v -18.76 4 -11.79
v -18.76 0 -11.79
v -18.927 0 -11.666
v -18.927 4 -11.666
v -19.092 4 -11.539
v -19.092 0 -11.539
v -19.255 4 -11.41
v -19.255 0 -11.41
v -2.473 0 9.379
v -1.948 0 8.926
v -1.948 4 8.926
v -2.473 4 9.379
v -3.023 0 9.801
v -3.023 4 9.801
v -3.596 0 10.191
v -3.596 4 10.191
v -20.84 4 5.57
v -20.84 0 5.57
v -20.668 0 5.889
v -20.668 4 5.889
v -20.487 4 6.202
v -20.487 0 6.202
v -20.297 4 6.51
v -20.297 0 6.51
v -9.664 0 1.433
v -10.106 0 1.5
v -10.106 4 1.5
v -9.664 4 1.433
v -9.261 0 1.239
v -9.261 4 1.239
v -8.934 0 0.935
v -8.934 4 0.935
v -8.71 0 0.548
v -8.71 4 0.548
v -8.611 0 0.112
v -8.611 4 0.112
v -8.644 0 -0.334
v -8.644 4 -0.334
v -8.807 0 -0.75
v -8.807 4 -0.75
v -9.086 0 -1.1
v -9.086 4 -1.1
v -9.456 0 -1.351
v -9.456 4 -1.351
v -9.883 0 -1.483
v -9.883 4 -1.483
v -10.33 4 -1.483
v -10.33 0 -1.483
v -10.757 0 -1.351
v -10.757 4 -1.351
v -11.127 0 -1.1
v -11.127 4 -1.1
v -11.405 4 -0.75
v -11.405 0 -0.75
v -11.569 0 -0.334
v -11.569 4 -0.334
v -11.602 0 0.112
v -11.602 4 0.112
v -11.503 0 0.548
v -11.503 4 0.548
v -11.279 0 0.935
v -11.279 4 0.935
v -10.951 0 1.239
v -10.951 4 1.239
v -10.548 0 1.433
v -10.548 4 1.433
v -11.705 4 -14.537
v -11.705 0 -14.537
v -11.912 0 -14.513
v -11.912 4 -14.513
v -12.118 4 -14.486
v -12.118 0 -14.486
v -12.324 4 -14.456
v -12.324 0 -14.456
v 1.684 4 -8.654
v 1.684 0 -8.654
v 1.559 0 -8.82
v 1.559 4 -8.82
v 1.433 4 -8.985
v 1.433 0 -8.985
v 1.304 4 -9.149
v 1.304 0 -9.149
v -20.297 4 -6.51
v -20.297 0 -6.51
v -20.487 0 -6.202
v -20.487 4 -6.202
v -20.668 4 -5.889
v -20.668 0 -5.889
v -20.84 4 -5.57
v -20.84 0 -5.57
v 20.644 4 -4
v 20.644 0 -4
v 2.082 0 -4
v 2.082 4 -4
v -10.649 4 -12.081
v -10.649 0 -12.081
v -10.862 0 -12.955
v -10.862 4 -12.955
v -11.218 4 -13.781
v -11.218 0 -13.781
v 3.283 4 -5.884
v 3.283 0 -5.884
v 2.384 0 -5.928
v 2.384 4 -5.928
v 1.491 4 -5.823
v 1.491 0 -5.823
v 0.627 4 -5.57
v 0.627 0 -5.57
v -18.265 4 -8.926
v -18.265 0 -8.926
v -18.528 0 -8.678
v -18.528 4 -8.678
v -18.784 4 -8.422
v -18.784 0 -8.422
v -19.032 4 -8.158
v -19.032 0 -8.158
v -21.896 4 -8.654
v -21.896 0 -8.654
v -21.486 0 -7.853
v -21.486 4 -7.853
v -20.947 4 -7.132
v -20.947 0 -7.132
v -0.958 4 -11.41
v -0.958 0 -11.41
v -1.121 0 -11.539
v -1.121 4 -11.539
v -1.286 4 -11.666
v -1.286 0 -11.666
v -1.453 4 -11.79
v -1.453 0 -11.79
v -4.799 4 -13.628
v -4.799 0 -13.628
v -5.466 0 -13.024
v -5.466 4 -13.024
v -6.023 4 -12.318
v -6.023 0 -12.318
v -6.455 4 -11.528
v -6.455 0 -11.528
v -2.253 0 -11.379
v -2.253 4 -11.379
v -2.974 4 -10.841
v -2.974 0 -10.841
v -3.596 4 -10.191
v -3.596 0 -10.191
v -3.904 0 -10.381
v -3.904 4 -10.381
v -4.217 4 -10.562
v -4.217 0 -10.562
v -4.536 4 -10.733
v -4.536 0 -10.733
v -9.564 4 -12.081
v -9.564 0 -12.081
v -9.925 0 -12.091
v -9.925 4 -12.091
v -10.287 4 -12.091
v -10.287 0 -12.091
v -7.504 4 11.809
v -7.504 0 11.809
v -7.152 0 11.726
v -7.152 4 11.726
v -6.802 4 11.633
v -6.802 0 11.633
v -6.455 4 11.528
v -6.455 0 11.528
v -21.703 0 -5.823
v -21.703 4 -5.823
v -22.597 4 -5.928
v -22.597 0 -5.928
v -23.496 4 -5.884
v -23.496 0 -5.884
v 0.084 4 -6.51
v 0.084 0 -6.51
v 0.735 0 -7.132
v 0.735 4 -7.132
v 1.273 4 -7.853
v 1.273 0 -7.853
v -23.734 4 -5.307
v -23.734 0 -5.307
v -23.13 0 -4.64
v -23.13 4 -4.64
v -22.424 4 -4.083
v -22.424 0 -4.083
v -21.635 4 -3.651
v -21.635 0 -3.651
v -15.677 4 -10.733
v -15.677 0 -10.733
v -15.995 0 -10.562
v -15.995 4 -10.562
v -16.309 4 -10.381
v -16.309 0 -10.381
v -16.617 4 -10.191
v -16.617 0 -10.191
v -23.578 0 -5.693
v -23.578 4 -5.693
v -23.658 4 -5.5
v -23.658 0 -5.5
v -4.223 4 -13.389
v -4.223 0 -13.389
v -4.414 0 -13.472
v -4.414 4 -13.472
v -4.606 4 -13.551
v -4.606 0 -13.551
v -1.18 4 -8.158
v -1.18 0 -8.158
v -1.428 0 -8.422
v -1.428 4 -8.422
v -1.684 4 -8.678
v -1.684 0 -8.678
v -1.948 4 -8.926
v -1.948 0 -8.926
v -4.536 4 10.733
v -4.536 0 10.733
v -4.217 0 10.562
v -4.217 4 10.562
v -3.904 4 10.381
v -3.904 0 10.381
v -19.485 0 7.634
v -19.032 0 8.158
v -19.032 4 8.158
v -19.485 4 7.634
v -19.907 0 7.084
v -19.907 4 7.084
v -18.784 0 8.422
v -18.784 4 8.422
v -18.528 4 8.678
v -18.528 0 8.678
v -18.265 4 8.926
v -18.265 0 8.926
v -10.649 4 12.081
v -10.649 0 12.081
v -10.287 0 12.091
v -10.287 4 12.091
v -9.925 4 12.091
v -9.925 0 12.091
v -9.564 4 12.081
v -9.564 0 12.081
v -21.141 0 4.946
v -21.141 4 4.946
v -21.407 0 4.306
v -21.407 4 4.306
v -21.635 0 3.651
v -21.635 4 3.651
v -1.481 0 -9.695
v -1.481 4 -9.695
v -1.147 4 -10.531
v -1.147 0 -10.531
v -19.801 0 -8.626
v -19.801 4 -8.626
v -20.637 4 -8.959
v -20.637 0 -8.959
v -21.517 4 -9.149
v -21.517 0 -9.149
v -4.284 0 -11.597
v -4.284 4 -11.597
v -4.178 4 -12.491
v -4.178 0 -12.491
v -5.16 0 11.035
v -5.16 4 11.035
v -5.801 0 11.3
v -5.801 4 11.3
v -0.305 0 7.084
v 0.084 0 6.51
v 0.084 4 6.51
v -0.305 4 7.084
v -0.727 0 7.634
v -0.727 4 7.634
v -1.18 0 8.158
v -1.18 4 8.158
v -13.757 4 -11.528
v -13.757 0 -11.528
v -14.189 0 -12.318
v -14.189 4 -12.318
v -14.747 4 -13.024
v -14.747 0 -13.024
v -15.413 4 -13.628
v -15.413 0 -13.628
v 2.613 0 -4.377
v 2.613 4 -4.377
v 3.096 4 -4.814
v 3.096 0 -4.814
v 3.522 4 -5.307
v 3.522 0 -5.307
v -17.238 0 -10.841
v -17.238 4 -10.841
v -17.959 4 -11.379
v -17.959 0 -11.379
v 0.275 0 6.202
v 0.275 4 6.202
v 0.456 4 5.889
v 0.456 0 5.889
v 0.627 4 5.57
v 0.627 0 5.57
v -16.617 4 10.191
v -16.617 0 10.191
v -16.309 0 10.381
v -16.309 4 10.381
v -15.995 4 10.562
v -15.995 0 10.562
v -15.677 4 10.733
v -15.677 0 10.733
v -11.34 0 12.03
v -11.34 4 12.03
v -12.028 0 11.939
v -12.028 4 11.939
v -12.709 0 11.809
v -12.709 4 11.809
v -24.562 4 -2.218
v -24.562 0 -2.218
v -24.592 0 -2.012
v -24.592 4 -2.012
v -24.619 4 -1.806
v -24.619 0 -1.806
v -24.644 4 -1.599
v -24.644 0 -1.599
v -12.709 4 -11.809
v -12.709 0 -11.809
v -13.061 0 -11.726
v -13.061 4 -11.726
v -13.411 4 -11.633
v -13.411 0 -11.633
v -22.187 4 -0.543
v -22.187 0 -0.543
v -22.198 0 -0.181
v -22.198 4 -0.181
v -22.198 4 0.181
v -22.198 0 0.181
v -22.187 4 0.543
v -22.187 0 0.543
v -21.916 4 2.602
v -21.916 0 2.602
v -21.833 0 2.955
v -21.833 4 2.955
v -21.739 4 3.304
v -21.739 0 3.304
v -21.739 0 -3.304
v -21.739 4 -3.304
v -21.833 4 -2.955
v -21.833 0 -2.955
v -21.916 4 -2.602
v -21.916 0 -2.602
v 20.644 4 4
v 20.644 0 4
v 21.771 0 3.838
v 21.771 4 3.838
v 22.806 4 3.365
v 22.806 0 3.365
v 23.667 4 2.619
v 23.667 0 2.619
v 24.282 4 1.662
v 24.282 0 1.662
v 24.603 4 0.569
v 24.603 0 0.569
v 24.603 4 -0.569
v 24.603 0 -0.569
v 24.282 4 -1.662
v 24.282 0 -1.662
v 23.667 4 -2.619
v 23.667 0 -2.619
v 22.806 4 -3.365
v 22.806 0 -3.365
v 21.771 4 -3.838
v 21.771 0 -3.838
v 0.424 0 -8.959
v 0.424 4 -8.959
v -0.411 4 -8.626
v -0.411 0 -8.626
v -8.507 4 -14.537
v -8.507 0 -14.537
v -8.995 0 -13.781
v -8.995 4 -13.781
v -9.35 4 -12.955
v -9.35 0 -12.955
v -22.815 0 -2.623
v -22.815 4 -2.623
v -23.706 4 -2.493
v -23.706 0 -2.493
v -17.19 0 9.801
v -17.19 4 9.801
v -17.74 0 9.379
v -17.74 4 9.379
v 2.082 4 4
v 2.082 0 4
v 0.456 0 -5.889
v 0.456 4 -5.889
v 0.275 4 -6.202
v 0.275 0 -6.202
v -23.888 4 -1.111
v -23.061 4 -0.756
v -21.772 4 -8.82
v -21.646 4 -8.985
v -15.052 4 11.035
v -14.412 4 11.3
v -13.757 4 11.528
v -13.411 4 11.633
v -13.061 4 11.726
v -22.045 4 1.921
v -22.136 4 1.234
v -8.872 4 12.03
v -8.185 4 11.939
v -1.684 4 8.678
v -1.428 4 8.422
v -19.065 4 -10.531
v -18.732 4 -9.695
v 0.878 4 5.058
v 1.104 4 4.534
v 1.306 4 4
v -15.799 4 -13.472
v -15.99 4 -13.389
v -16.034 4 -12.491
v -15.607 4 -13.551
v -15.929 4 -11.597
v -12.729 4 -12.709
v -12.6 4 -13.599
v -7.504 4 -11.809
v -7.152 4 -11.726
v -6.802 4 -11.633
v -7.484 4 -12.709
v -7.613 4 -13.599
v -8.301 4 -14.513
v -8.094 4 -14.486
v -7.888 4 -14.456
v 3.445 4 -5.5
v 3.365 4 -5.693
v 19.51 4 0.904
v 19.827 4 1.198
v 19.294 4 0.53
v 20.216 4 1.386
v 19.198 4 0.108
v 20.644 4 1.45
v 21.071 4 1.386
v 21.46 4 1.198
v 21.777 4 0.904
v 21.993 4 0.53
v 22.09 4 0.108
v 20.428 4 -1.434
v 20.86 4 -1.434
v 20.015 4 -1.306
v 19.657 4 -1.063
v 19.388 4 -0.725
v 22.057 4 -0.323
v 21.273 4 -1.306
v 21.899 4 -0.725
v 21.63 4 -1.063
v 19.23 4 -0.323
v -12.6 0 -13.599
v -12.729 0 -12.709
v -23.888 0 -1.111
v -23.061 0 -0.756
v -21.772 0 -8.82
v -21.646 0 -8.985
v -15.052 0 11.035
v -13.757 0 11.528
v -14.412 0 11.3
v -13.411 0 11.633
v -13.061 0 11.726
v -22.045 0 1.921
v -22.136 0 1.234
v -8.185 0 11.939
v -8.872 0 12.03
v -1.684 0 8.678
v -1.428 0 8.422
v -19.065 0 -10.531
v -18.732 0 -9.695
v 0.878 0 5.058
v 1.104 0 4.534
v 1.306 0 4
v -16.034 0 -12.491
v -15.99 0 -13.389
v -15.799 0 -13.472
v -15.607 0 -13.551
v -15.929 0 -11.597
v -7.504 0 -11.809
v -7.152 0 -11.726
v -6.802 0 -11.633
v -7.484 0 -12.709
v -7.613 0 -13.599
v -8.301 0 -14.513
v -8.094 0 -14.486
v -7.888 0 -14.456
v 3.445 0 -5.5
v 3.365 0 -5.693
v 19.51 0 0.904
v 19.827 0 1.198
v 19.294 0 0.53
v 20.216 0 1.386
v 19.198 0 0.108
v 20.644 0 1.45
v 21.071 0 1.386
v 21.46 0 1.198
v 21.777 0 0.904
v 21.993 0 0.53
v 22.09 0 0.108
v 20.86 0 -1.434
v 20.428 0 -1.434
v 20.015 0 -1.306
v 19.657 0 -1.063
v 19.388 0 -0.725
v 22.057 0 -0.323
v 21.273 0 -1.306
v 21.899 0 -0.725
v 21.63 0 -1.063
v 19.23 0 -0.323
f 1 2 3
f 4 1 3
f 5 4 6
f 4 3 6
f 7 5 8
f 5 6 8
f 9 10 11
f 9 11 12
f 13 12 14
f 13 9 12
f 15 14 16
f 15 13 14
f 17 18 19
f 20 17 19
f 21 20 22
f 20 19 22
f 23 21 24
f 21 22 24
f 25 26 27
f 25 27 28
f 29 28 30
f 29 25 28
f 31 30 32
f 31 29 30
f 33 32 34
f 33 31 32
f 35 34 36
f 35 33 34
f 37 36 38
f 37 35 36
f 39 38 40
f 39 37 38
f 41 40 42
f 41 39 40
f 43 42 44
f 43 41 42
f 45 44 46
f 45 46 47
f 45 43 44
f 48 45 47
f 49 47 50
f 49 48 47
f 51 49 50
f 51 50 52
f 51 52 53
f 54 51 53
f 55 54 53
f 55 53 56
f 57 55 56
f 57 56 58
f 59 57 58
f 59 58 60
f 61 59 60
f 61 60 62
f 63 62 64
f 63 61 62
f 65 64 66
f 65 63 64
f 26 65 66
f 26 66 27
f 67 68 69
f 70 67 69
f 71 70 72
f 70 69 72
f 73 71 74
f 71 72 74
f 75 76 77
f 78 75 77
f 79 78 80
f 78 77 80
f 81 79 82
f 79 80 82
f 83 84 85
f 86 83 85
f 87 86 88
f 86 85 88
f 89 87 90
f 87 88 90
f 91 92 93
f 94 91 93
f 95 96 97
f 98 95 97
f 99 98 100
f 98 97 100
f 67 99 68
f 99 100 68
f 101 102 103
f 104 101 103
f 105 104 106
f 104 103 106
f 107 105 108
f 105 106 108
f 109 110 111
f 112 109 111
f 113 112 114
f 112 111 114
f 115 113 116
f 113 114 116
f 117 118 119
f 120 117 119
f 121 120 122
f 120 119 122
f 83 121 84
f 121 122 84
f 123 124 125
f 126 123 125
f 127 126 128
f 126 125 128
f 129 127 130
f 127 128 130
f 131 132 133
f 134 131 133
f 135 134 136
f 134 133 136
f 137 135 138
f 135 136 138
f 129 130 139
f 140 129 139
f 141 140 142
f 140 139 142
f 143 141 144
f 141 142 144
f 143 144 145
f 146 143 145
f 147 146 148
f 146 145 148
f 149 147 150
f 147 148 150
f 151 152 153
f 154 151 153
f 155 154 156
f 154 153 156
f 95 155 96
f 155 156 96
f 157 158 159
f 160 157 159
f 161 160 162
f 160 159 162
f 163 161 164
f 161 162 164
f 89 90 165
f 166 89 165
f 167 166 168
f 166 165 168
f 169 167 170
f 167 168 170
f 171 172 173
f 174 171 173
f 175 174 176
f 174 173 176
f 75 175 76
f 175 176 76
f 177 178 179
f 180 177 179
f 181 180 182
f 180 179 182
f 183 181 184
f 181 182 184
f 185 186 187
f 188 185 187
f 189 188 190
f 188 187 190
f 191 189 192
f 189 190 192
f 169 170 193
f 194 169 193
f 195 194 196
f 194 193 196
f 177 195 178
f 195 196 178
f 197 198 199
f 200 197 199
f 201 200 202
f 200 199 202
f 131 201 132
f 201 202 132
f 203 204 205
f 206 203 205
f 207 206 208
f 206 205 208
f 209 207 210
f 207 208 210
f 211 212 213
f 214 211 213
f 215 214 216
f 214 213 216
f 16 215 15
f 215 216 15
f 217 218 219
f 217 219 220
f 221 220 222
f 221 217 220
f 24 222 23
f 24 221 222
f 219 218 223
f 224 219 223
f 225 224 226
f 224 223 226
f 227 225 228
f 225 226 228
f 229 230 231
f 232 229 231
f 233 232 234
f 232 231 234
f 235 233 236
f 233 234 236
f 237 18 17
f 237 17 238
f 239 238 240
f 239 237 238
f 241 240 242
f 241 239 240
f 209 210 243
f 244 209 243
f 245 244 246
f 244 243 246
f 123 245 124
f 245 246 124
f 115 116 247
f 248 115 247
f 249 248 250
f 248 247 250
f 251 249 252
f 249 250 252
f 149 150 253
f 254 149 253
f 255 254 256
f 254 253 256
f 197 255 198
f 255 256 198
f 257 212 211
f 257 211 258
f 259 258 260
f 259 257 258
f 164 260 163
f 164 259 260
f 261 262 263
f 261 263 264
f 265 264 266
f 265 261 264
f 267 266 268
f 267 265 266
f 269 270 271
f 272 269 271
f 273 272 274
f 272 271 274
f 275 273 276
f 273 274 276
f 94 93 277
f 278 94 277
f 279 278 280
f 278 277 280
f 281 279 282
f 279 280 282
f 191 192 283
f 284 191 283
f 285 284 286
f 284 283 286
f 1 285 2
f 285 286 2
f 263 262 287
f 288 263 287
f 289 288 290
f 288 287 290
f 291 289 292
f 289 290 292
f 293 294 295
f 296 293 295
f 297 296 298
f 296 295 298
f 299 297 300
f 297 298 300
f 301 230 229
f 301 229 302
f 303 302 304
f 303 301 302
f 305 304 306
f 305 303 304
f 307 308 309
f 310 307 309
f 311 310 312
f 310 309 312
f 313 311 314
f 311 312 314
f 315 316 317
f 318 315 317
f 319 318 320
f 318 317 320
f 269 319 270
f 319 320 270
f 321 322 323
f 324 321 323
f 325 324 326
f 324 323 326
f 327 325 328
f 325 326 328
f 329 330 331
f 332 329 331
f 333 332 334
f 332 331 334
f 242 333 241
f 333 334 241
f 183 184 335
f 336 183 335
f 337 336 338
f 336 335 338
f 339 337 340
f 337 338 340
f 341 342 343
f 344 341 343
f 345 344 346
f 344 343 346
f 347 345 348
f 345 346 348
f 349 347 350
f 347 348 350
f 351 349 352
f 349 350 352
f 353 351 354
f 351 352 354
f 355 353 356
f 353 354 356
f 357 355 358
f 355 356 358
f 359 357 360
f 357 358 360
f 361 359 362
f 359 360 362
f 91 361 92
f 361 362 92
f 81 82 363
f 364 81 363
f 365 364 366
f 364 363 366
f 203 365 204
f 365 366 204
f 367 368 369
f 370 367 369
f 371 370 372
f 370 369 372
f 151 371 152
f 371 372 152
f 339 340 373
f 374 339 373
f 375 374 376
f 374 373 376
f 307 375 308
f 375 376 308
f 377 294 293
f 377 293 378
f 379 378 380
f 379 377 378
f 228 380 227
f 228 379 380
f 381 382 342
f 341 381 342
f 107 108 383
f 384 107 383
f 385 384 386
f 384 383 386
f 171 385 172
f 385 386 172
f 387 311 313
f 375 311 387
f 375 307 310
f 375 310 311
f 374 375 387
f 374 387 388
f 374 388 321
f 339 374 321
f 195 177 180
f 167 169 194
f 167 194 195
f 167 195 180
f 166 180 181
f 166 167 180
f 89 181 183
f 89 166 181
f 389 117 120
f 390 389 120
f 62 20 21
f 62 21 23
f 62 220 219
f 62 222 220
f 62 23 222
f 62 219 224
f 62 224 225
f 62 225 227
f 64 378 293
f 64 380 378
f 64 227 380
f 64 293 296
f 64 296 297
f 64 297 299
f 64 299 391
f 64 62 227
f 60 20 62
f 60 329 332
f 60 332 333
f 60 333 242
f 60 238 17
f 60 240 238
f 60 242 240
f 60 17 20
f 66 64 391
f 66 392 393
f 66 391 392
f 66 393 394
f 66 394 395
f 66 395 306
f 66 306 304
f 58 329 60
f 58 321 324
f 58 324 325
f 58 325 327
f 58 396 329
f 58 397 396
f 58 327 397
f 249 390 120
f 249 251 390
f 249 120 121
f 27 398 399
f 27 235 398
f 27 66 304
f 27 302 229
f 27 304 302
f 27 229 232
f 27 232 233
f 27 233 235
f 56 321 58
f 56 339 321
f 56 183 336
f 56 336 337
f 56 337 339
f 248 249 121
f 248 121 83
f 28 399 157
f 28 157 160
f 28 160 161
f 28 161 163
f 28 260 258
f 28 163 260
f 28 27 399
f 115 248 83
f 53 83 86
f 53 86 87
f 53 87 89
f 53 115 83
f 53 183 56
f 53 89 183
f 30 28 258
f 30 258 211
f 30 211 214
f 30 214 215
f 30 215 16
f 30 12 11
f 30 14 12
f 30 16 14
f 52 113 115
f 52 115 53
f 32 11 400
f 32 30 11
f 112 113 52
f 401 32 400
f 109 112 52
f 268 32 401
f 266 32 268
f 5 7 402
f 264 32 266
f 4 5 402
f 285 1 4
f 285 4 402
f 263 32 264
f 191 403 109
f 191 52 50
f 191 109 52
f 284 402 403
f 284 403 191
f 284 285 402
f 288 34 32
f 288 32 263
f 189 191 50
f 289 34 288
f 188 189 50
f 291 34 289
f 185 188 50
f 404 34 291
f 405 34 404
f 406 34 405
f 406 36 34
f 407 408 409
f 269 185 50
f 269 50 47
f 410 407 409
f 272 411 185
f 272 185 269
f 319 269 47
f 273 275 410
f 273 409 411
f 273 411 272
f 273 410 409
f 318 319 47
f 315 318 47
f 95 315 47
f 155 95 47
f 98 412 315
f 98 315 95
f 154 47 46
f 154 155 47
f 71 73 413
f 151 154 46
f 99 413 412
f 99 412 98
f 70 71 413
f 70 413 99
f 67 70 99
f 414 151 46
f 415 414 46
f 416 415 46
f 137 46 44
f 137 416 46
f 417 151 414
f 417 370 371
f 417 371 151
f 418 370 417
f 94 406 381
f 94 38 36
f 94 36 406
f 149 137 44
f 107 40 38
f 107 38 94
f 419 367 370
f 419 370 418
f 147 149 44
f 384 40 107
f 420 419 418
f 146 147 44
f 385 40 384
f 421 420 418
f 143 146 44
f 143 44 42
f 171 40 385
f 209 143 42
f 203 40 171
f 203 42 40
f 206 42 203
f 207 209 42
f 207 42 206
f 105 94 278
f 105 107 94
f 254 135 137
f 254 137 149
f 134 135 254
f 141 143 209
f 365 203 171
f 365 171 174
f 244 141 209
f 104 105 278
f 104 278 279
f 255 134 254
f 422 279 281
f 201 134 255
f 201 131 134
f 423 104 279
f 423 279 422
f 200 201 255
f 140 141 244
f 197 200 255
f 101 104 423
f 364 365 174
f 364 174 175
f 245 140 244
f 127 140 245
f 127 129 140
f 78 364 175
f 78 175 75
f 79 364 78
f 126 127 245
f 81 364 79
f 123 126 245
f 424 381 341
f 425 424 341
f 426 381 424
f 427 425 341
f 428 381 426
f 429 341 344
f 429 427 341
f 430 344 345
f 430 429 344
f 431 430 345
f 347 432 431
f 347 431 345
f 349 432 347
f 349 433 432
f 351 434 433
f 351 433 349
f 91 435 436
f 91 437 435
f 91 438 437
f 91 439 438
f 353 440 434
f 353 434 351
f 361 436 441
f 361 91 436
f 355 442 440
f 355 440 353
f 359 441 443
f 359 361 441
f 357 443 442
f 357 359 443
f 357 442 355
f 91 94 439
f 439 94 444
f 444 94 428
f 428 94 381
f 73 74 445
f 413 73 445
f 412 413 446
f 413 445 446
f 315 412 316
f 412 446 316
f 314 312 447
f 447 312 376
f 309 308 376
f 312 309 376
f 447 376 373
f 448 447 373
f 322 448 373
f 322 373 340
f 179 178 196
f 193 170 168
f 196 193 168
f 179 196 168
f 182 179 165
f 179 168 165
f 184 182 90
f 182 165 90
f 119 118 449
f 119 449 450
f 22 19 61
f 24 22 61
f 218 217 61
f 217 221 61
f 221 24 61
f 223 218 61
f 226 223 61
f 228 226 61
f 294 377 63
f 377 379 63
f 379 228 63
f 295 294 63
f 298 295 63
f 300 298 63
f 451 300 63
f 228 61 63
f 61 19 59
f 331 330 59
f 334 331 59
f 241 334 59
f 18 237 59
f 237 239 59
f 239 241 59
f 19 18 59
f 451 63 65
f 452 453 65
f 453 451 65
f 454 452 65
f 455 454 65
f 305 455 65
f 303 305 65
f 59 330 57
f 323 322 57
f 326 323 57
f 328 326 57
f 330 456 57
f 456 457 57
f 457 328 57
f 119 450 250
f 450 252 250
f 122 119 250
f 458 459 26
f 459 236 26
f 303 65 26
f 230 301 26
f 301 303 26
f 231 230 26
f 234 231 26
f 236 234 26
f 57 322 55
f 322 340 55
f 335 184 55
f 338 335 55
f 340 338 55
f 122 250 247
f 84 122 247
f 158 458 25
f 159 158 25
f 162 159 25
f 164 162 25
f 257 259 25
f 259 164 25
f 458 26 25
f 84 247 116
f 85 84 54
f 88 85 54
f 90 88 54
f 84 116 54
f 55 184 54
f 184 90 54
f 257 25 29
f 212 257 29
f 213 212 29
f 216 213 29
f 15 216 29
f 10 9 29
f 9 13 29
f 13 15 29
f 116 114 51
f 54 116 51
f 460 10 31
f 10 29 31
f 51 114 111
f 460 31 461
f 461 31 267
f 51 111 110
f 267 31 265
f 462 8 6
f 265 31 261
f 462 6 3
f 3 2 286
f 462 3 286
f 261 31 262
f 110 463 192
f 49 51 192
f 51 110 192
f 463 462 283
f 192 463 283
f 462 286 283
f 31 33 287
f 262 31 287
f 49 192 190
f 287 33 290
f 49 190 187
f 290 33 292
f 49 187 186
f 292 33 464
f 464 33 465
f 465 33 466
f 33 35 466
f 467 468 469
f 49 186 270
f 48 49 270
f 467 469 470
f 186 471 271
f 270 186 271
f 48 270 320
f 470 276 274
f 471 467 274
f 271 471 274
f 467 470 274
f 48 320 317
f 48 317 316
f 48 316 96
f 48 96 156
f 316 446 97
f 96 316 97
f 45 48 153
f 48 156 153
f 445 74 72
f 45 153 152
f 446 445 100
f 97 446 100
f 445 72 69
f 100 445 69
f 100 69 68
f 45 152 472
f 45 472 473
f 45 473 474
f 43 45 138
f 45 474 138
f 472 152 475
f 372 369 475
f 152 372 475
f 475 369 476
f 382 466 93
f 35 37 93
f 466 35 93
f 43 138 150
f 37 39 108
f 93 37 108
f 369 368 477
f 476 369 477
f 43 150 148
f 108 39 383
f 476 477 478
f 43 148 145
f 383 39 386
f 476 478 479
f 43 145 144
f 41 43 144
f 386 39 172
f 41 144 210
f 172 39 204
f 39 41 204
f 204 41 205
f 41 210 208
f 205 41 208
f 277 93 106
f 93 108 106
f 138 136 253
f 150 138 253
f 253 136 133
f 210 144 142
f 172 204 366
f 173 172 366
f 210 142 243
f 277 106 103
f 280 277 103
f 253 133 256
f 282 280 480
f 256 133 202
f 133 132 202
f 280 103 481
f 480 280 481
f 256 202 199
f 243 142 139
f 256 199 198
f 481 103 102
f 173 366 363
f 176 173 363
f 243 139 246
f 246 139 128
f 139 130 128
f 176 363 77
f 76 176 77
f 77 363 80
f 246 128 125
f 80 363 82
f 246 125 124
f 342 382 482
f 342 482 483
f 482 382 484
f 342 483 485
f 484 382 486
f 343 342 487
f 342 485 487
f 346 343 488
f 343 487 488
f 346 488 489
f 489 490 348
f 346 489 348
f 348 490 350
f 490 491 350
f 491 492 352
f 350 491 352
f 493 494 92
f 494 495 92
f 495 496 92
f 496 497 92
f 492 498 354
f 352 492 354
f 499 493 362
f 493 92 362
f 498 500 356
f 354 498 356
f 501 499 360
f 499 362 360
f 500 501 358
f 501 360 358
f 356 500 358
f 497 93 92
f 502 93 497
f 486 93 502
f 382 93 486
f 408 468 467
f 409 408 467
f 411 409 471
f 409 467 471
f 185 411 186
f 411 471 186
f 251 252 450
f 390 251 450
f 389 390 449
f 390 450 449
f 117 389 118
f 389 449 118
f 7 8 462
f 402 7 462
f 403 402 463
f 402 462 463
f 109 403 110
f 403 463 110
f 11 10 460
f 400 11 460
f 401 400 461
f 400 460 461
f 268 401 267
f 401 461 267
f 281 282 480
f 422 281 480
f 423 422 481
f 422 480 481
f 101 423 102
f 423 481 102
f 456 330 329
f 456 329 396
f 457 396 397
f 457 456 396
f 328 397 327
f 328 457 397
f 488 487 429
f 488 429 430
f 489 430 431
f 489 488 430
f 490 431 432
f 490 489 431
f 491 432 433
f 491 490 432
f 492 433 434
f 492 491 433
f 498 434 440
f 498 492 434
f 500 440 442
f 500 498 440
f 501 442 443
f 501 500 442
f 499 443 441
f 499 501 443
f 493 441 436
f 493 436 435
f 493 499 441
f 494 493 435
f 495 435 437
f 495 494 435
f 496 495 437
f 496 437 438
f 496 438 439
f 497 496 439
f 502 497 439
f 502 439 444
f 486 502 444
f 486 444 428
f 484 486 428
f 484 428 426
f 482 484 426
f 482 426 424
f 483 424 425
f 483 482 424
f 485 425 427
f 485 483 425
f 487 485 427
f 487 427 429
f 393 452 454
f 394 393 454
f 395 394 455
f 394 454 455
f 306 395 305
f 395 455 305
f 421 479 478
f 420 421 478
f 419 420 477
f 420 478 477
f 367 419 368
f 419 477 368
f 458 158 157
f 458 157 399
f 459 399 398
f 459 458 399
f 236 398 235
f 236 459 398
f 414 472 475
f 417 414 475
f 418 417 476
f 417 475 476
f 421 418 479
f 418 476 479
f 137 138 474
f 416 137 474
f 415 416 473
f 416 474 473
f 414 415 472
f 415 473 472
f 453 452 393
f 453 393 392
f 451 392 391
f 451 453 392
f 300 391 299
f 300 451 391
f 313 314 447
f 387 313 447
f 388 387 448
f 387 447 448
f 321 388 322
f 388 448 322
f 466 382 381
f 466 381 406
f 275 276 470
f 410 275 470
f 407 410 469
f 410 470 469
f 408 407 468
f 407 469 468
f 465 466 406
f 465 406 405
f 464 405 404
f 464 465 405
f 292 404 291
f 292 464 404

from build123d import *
from build123d.topology import SkipClean

# Parameters (mm, degrees)
SKETCH1_R           = 1.5
SKETCH1_R_2         = 1.45
BOSS_EXTRUDE1_DEPTH = 4
CUT_EXTRUDE1_START  = -10
CUT_EXTRUDE1_DEPTH  = 10


with BuildPart() as part:
    # Sketch1 → Boss-Extrude1 (new body)
    with BuildSketch(Plane(origin=(0, 0, 0), x_dir=(1, 0, 0), z_dir=(0, 1, 0))):
        with BuildLine():
            Line((20.643657446, 4), (2.081641936, 4))
            ThreePointArc((2.081641936, 4), (2.861028333, 4.588201733), (3.521749436, 5.30713988))
            ThreePointArc((3.521749436, 5.30713988), (3.405395609, 5.596745198), (3.282888305, 5.883801663))
            ThreePointArc((3.282888305, 5.883801663), (1.93527598, 5.894040025), (0.627094961, 5.57027124))
            ThreePointArc((0.627094961, 5.57027124), (0.366286148, 6.046375), (0.084372603, 6.510293938))
            ThreePointArc((0.084372603, 6.510293938), (1.018855105, 7.48132754), (1.683794586, 8.65351323))
            ThreePointArc((1.683794586, 8.65351323), (1.496450048, 8.903135899), (1.303821399, 9.148703928))
            ThreePointArc((1.303821399, 9.148703928), (-0.000522033, 8.809805691), (-1.180330337, 8.158486898))
            ThreePointArc((-1.180330337, 8.158486898), (-1.555477026, 8.550865528), (-1.947855656, 8.926012217))
            ThreePointArc((-1.947855656, 8.926012217), (-1.296536862, 10.105820521), (-0.957638625, 11.410163953))
            ThreePointArc((-0.957638625, 11.410163953), (-1.203206655, 11.602792602), (-1.452829324, 11.79013714))
            ThreePointArc((-1.452829324, 11.79013714), (-2.625015014, 11.125197659), (-3.596048616, 10.190715157))
            ThreePointArc((-3.596048616, 10.190715157), (-4.059967554, 10.472628702), (-4.536071314, 10.733437515))
            ThreePointArc((-4.536071314, 10.733437515), (-4.212302529, 12.041618533), (-4.222540891, 13.389230859))
            ThreePointArc((-4.222540891, 13.389230859), (-4.509597355, 13.511738163), (-4.799202674, 13.62809199))
            ThreePointArc((-4.799202674, 13.62809199), (-5.759348103, 12.682425791), (-6.455432668, 11.528463019))
            ThreePointArc((-6.455432668, 11.528463019), (-6.976508546, 11.680699536), (-7.503891752, 11.809396783))
            ThreePointArc((-7.503891752, 11.809396783), (-7.529737283, 13.156800143), (-7.888414517, 14.455843809))
            ThreePointArc((-7.888414517, 14.455843809), (-8.197396993, 14.499881098), (-8.507248835, 14.537314892))
            ThreePointArc((-8.507248835, 14.537314892), (-9.18992168, 13.375367565), (-9.563620196, 12.080565177))
            ThreePointArc((-9.563620196, 12.080565177), (-10.106342554, 12.09275), (-10.649064912, 12.080565177))
            ThreePointArc((-10.649064912, 12.080565177), (-11.022763428, 13.375367565), (-11.705436272, 14.537314892))
            ThreePointArc((-11.705436272, 14.537314892), (-12.015288115, 14.499881098), (-12.324270591, 14.455843809))
            ThreePointArc((-12.324270591, 14.455843809), (-12.682947825, 13.156800143), (-12.708793355, 11.809396783))
            ThreePointArc((-12.708793355, 11.809396783), (-13.236176561, 11.680699536), (-13.757252439, 11.528463019))
            ThreePointArc((-13.757252439, 11.528463019), (-14.453337005, 12.682425791), (-15.413482434, 13.62809199))
            ThreePointArc((-15.413482434, 13.62809199), (-15.703087752, 13.511738163), (-15.990144217, 13.389230859))
            ThreePointArc((-15.990144217, 13.389230859), (-16.000382579, 12.041618533), (-15.676613793, 10.733437515))
            ThreePointArc((-15.676613793, 10.733437515), (-16.152717554, 10.472628702), (-16.616636492, 10.190715157))
            ThreePointArc((-16.616636492, 10.190715157), (-17.587670094, 11.125197659), (-18.759855783, 11.79013714))
            ThreePointArc((-18.759855783, 11.79013714), (-19.009478453, 11.602792602), (-19.255046482, 11.410163953))
            ThreePointArc((-19.255046482, 11.410163953), (-18.916148245, 10.105820521), (-18.264829452, 8.926012217))
            ThreePointArc((-18.264829452, 8.926012217), (-18.657208082, 8.550865528), (-19.032354771, 8.158486898))
            ThreePointArc((-19.032354771, 8.158486898), (-20.212163074, 8.809805691), (-21.516506507, 9.148703928))
            ThreePointArc((-21.516506507, 9.148703928), (-21.709135156, 8.903135899), (-21.896479694, 8.65351323))
            ThreePointArc((-21.896479694, 8.65351323), (-21.231540213, 7.48132754), (-20.297057711, 6.510293938))
            ThreePointArc((-20.297057711, 6.510293938), (-20.578971255, 6.046375), (-20.839780068, 5.57027124))
            ThreePointArc((-20.839780068, 5.57027124), (-22.147961087, 5.894040025), (-23.495573413, 5.883801663))
            ThreePointArc((-23.495573413, 5.883801663), (-23.618080717, 5.596745198), (-23.734434544, 5.30713988))
            ThreePointArc((-23.734434544, 5.30713988), (-22.788768345, 4.346994451), (-21.634805572, 3.650909885))
            ThreePointArc((-21.634805572, 3.650909885), (-21.78704209, 3.129834008), (-21.915739337, 2.602450802))
            ThreePointArc((-21.915739337, 2.602450802), (-23.263142697, 2.576605271), (-24.562186363, 2.217928037))
            ThreePointArc((-24.562186363, 2.217928037), (-24.606223651, 1.908945561), (-24.643657446, 1.599093719))
            ThreePointArc((-24.643657446, 1.599093719), (-23.481710119, 0.916420874), (-22.186907731, 0.542722358))
            ThreePointArc((-22.186907731, 0.542722358), (-22.199092554, 0), (-22.186907731, -0.542722358))
            ThreePointArc((-22.186907731, -0.542722358), (-23.481710119, -0.916420874), (-24.643657446, -1.599093719))
            ThreePointArc((-24.643657446, -1.599093719), (-24.606223651, -1.908945561), (-24.562186363, -2.217928037))
            ThreePointArc((-24.562186363, -2.217928037), (-23.263142697, -2.576605271), (-21.915739337, -2.602450802))
            ThreePointArc((-21.915739337, -2.602450802), (-21.78704209, -3.129834008), (-21.634805572, -3.650909885))
            ThreePointArc((-21.634805572, -3.650909885), (-22.788768345, -4.346994451), (-23.734434544, -5.30713988))
            ThreePointArc((-23.734434544, -5.30713988), (-23.618080717, -5.596745198), (-23.495573413, -5.883801663))
            ThreePointArc((-23.495573413, -5.883801663), (-22.147961087, -5.894040025), (-20.839780068, -5.57027124))
            ThreePointArc((-20.839780068, -5.57027124), (-20.578971255, -6.046375), (-20.297057711, -6.510293938))
            ThreePointArc((-20.297057711, -6.510293938), (-21.231540213, -7.48132754), (-21.896479694, -8.65351323))
            ThreePointArc((-21.896479694, -8.65351323), (-21.709135156, -8.903135899), (-21.516506507, -9.148703928))
            ThreePointArc((-21.516506507, -9.148703928), (-20.212163074, -8.809805691), (-19.032354771, -8.158486898))
            ThreePointArc((-19.032354771, -8.158486898), (-18.657208082, -8.550865528), (-18.264829452, -8.926012217))
            ThreePointArc((-18.264829452, -8.926012217), (-18.916148245, -10.105820521), (-19.255046482, -11.410163953))
            ThreePointArc((-19.255046482, -11.410163953), (-19.009478453, -11.602792602), (-18.759855783, -11.79013714))
            ThreePointArc((-18.759855783, -11.79013714), (-17.587670094, -11.125197659), (-16.616636492, -10.190715157))
            ThreePointArc((-16.616636492, -10.190715157), (-16.152717554, -10.472628702), (-15.676613793, -10.733437515))
            ThreePointArc((-15.676613793, -10.733437515), (-16.000382579, -12.041618533), (-15.990144217, -13.389230859))
            ThreePointArc((-15.990144217, -13.389230859), (-15.703087752, -13.511738163), (-15.413482434, -13.62809199))
            ThreePointArc((-15.413482434, -13.62809199), (-14.453337005, -12.682425791), (-13.757252439, -11.528463019))
            ThreePointArc((-13.757252439, -11.528463019), (-13.236176561, -11.680699536), (-12.708793355, -11.809396783))
            ThreePointArc((-12.708793355, -11.809396783), (-12.682947825, -13.156800143), (-12.324270591, -14.455843809))
            ThreePointArc((-12.324270591, -14.455843809), (-12.015288115, -14.499881098), (-11.705436272, -14.537314892))
            ThreePointArc((-11.705436272, -14.537314892), (-11.022763428, -13.375367565), (-10.649064912, -12.080565177))
            ThreePointArc((-10.649064912, -12.080565177), (-10.106342554, -12.09275), (-9.563620196, -12.080565177))
            ThreePointArc((-9.563620196, -12.080565177), (-9.18992168, -13.375367565), (-8.507248835, -14.537314892))
            ThreePointArc((-8.507248835, -14.537314892), (-8.197396993, -14.499881098), (-7.888414517, -14.455843809))
            ThreePointArc((-7.888414517, -14.455843809), (-7.529737283, -13.156800143), (-7.503891752, -11.809396783))
            ThreePointArc((-7.503891752, -11.809396783), (-6.976508546, -11.680699536), (-6.455432668, -11.528463019))
            ThreePointArc((-6.455432668, -11.528463019), (-5.759348103, -12.682425791), (-4.799202674, -13.62809199))
            ThreePointArc((-4.799202674, -13.62809199), (-4.509597355, -13.511738163), (-4.222540891, -13.389230859))
            ThreePointArc((-4.222540891, -13.389230859), (-4.212302529, -12.041618533), (-4.536071314, -10.733437515))
            ThreePointArc((-4.536071314, -10.733437515), (-4.059967554, -10.472628702), (-3.596048616, -10.190715157))
            ThreePointArc((-3.596048616, -10.190715157), (-2.625015014, -11.125197659), (-1.452829324, -11.79013714))
            ThreePointArc((-1.452829324, -11.79013714), (-1.203206655, -11.602792602), (-0.957638625, -11.410163953))
            ThreePointArc((-0.957638625, -11.410163953), (-1.296536862, -10.105820521), (-1.947855656, -8.926012217))
            ThreePointArc((-1.947855656, -8.926012217), (-1.555477026, -8.550865528), (-1.180330337, -8.158486898))
            ThreePointArc((-1.180330337, -8.158486898), (-0.000522033, -8.809805691), (1.303821399, -9.148703928))
            ThreePointArc((1.303821399, -9.148703928), (1.496450048, -8.903135899), (1.683794586, -8.65351323))
            ThreePointArc((1.683794586, -8.65351323), (1.018855105, -7.48132754), (0.084372603, -6.510293938))
            ThreePointArc((0.084372603, -6.510293938), (0.366286148, -6.046375), (0.627094961, -5.57027124))
            ThreePointArc((0.627094961, -5.57027124), (1.93527598, -5.894040025), (3.282888305, -5.883801663))
            ThreePointArc((3.282888305, -5.883801663), (3.405395609, -5.596745198), (3.521749436, -5.30713988))
            ThreePointArc((3.521749436, -5.30713988), (2.861028333, -4.588201733), (2.081641936, -4))
            Line((2.081641936, -4), (20.643657446, -4))
            ThreePointArc((20.643657446, -4), (24.643657446, 0), (20.643657446, 4))
        make_face()
        with Locations(Location((-10.106342554, 0, 0), (0, 0, 270))):
            Circle(SKETCH1_R, mode=Mode.SUBTRACT)
        with Locations(Location((20.643657446, 0, 0), (0, 0, 270))):
            Circle(SKETCH1_R_2, mode=Mode.SUBTRACT)
    extrude(amount=BOSS_EXTRUDE1_DEPTH)

    # Sketch2 → Cut-Extrude1 (cut)
    with SkipClean():  # the faces are left unmerged after this step: merging them gives an invalid solid
        with BuildSketch(Plane(origin=(0, 4, 0), x_dir=(1, 0, 0), z_dir=(0, 1, 0)).offset(CUT_EXTRUDE1_START)):
            with BuildLine():
                ThreePointArc((-24.562186363, -2.217928037), (-23.263142697, -2.576605271), (-21.915739337, -2.602450802))
                ThreePointArc((-21.915739337, -2.602450802), (-22.095637401, -1.578420611), (-22.186907731, -0.542722358))
                ThreePointArc((-22.186907731, -0.542722358), (-23.481710119, -0.916420874), (-24.643657446, -1.599093719))
                ThreePointArc((-24.643657446, -1.599093719), (-24.606223651, -1.908945561), (-24.562186363, -2.217928037))
            make_face()
            with BuildLine():
                ThreePointArc((-23.495573413, -5.883801663), (-22.147961087, -5.894040025), (-20.839780068, -5.57027124))
                ThreePointArc((-20.839780068, -5.57027124), (-21.278586771, -4.627695077), (-21.634805572, -3.650909885))
                ThreePointArc((-21.634805572, -3.650909885), (-22.788768345, -4.346994451), (-23.734434544, -5.30713988))
                ThreePointArc((-23.734434544, -5.30713988), (-23.618080717, -5.596745198), (-23.495573413, -5.883801663))
            make_face()
            with BuildLine():
                ThreePointArc((-21.516506507, -9.148703928), (-20.212163074, -8.809805691), (-19.032354771, -8.158486898))
                ThreePointArc((-19.032354771, -8.158486898), (-19.70016616, -7.361599771), (-20.297057711, -6.510293938))
                ThreePointArc((-20.297057711, -6.510293938), (-21.231540213, -7.48132754), (-21.896479694, -8.65351323))
                ThreePointArc((-21.896479694, -8.65351323), (-21.709135156, -8.903135899), (-21.516506507, -9.148703928))
            make_face()
            with BuildLine():
                ThreePointArc((-18.759855783, -11.79013714), (-17.587670094, -11.125197659), (-16.616636492, -10.190715157))
                ThreePointArc((-16.616636492, -10.190715157), (-17.467942324, -9.593823606), (-18.264829452, -8.926012217))
                ThreePointArc((-18.264829452, -8.926012217), (-18.916148245, -10.105820521), (-19.255046482, -11.410163953))
                ThreePointArc((-19.255046482, -11.410163953), (-19.009478453, -11.602792602), (-18.759855783, -11.79013714))
            make_face()
            with BuildLine():
                ThreePointArc((-15.413482434, -13.62809199), (-14.453337005, -12.682425791), (-13.757252439, -11.528463019))
                ThreePointArc((-13.757252439, -11.528463019), (-14.734037631, -11.172244217), (-15.676613793, -10.733437515))
                ThreePointArc((-15.676613793, -10.733437515), (-16.000382579, -12.041618533), (-15.990144217, -13.389230859))
                ThreePointArc((-15.990144217, -13.389230859), (-15.703087752, -13.511738163), (-15.413482434, -13.62809199))
            make_face()
            with BuildLine():
                ThreePointArc((-11.705436272, -14.537314892), (-11.022763428, -13.375367565), (-10.649064912, -12.080565177))
                ThreePointArc((-10.649064912, -12.080565177), (-11.684763165, -11.989294847), (-12.708793355, -11.809396783))
                ThreePointArc((-12.708793355, -11.809396783), (-12.682947825, -13.156800143), (-12.324270591, -14.455843809))
                ThreePointArc((-12.324270591, -14.455843809), (-12.015288115, -14.499881098), (-11.705436272, -14.537314892))
            make_face()
            with BuildLine():
                ThreePointArc((-7.888414517, -14.455843809), (-7.529737283, -13.156800143), (-7.503891752, -11.809396783))
                ThreePointArc((-7.503891752, -11.809396783), (-8.527921943, -11.989294847), (-9.563620196, -12.080565177))
                ThreePointArc((-9.563620196, -12.080565177), (-9.18992168, -13.375367565), (-8.507248835, -14.537314892))
                ThreePointArc((-8.507248835, -14.537314892), (-8.197396993, -14.499881098), (-7.888414517, -14.455843809))
            make_face()
            with BuildLine():
                ThreePointArc((-4.222540891, -13.389230859), (-4.212302529, -12.041618533), (-4.536071314, -10.733437515))
                ThreePointArc((-4.536071314, -10.733437515), (-5.478647477, -11.172244217), (-6.455432668, -11.528463019))
                ThreePointArc((-6.455432668, -11.528463019), (-5.759348103, -12.682425791), (-4.799202674, -13.62809199))
                ThreePointArc((-4.799202674, -13.62809199), (-4.509597355, -13.511738163), (-4.222540891, -13.389230859))
            make_face()
            with BuildLine():
                ThreePointArc((-0.957638625, -11.410163953), (-1.296536862, -10.105820521), (-1.947855656, -8.926012217))
                ThreePointArc((-1.947855656, -8.926012217), (-2.744742783, -9.593823606), (-3.596048616, -10.190715157))
                ThreePointArc((-3.596048616, -10.190715157), (-2.625015014, -11.125197659), (-1.452829324, -11.79013714))
                ThreePointArc((-1.452829324, -11.79013714), (-1.203206655, -11.602792602), (-0.957638625, -11.410163953))
            make_face()
            with BuildLine():
                ThreePointArc((1.683794586, -8.65351323), (1.018855105, -7.48132754), (0.084372603, -6.510293938))
                ThreePointArc((0.084372603, -6.510293938), (-0.512518948, -7.361599771), (-1.180330337, -8.158486898))
                ThreePointArc((-1.180330337, -8.158486898), (-0.000522033, -8.809805691), (1.303821399, -9.148703928))
                ThreePointArc((1.303821399, -9.148703928), (1.496450048, -8.903135899), (1.683794586, -8.65351323))
            make_face()
            with BuildLine():
                ThreePointArc((3.521749436, -5.30713988), (2.861028333, -4.588201733), (2.081641936, -4))
                Line((2.081641936, -4), (1.305695063, -4))
                ThreePointArc((1.305695063, -4), (0.994195953, -4.797149927), (0.627094961, -5.57027124))
                ThreePointArc((0.627094961, -5.57027124), (1.93527598, -5.894040025), (3.282888305, -5.883801663))
                ThreePointArc((3.282888305, -5.883801663), (3.405395609, -5.596745198), (3.521749436, -5.30713988))
            make_face()
        extrude(amount=CUT_EXTRUDE1_DEPTH, mode=Mode.SUBTRACT)


solid = part.part
